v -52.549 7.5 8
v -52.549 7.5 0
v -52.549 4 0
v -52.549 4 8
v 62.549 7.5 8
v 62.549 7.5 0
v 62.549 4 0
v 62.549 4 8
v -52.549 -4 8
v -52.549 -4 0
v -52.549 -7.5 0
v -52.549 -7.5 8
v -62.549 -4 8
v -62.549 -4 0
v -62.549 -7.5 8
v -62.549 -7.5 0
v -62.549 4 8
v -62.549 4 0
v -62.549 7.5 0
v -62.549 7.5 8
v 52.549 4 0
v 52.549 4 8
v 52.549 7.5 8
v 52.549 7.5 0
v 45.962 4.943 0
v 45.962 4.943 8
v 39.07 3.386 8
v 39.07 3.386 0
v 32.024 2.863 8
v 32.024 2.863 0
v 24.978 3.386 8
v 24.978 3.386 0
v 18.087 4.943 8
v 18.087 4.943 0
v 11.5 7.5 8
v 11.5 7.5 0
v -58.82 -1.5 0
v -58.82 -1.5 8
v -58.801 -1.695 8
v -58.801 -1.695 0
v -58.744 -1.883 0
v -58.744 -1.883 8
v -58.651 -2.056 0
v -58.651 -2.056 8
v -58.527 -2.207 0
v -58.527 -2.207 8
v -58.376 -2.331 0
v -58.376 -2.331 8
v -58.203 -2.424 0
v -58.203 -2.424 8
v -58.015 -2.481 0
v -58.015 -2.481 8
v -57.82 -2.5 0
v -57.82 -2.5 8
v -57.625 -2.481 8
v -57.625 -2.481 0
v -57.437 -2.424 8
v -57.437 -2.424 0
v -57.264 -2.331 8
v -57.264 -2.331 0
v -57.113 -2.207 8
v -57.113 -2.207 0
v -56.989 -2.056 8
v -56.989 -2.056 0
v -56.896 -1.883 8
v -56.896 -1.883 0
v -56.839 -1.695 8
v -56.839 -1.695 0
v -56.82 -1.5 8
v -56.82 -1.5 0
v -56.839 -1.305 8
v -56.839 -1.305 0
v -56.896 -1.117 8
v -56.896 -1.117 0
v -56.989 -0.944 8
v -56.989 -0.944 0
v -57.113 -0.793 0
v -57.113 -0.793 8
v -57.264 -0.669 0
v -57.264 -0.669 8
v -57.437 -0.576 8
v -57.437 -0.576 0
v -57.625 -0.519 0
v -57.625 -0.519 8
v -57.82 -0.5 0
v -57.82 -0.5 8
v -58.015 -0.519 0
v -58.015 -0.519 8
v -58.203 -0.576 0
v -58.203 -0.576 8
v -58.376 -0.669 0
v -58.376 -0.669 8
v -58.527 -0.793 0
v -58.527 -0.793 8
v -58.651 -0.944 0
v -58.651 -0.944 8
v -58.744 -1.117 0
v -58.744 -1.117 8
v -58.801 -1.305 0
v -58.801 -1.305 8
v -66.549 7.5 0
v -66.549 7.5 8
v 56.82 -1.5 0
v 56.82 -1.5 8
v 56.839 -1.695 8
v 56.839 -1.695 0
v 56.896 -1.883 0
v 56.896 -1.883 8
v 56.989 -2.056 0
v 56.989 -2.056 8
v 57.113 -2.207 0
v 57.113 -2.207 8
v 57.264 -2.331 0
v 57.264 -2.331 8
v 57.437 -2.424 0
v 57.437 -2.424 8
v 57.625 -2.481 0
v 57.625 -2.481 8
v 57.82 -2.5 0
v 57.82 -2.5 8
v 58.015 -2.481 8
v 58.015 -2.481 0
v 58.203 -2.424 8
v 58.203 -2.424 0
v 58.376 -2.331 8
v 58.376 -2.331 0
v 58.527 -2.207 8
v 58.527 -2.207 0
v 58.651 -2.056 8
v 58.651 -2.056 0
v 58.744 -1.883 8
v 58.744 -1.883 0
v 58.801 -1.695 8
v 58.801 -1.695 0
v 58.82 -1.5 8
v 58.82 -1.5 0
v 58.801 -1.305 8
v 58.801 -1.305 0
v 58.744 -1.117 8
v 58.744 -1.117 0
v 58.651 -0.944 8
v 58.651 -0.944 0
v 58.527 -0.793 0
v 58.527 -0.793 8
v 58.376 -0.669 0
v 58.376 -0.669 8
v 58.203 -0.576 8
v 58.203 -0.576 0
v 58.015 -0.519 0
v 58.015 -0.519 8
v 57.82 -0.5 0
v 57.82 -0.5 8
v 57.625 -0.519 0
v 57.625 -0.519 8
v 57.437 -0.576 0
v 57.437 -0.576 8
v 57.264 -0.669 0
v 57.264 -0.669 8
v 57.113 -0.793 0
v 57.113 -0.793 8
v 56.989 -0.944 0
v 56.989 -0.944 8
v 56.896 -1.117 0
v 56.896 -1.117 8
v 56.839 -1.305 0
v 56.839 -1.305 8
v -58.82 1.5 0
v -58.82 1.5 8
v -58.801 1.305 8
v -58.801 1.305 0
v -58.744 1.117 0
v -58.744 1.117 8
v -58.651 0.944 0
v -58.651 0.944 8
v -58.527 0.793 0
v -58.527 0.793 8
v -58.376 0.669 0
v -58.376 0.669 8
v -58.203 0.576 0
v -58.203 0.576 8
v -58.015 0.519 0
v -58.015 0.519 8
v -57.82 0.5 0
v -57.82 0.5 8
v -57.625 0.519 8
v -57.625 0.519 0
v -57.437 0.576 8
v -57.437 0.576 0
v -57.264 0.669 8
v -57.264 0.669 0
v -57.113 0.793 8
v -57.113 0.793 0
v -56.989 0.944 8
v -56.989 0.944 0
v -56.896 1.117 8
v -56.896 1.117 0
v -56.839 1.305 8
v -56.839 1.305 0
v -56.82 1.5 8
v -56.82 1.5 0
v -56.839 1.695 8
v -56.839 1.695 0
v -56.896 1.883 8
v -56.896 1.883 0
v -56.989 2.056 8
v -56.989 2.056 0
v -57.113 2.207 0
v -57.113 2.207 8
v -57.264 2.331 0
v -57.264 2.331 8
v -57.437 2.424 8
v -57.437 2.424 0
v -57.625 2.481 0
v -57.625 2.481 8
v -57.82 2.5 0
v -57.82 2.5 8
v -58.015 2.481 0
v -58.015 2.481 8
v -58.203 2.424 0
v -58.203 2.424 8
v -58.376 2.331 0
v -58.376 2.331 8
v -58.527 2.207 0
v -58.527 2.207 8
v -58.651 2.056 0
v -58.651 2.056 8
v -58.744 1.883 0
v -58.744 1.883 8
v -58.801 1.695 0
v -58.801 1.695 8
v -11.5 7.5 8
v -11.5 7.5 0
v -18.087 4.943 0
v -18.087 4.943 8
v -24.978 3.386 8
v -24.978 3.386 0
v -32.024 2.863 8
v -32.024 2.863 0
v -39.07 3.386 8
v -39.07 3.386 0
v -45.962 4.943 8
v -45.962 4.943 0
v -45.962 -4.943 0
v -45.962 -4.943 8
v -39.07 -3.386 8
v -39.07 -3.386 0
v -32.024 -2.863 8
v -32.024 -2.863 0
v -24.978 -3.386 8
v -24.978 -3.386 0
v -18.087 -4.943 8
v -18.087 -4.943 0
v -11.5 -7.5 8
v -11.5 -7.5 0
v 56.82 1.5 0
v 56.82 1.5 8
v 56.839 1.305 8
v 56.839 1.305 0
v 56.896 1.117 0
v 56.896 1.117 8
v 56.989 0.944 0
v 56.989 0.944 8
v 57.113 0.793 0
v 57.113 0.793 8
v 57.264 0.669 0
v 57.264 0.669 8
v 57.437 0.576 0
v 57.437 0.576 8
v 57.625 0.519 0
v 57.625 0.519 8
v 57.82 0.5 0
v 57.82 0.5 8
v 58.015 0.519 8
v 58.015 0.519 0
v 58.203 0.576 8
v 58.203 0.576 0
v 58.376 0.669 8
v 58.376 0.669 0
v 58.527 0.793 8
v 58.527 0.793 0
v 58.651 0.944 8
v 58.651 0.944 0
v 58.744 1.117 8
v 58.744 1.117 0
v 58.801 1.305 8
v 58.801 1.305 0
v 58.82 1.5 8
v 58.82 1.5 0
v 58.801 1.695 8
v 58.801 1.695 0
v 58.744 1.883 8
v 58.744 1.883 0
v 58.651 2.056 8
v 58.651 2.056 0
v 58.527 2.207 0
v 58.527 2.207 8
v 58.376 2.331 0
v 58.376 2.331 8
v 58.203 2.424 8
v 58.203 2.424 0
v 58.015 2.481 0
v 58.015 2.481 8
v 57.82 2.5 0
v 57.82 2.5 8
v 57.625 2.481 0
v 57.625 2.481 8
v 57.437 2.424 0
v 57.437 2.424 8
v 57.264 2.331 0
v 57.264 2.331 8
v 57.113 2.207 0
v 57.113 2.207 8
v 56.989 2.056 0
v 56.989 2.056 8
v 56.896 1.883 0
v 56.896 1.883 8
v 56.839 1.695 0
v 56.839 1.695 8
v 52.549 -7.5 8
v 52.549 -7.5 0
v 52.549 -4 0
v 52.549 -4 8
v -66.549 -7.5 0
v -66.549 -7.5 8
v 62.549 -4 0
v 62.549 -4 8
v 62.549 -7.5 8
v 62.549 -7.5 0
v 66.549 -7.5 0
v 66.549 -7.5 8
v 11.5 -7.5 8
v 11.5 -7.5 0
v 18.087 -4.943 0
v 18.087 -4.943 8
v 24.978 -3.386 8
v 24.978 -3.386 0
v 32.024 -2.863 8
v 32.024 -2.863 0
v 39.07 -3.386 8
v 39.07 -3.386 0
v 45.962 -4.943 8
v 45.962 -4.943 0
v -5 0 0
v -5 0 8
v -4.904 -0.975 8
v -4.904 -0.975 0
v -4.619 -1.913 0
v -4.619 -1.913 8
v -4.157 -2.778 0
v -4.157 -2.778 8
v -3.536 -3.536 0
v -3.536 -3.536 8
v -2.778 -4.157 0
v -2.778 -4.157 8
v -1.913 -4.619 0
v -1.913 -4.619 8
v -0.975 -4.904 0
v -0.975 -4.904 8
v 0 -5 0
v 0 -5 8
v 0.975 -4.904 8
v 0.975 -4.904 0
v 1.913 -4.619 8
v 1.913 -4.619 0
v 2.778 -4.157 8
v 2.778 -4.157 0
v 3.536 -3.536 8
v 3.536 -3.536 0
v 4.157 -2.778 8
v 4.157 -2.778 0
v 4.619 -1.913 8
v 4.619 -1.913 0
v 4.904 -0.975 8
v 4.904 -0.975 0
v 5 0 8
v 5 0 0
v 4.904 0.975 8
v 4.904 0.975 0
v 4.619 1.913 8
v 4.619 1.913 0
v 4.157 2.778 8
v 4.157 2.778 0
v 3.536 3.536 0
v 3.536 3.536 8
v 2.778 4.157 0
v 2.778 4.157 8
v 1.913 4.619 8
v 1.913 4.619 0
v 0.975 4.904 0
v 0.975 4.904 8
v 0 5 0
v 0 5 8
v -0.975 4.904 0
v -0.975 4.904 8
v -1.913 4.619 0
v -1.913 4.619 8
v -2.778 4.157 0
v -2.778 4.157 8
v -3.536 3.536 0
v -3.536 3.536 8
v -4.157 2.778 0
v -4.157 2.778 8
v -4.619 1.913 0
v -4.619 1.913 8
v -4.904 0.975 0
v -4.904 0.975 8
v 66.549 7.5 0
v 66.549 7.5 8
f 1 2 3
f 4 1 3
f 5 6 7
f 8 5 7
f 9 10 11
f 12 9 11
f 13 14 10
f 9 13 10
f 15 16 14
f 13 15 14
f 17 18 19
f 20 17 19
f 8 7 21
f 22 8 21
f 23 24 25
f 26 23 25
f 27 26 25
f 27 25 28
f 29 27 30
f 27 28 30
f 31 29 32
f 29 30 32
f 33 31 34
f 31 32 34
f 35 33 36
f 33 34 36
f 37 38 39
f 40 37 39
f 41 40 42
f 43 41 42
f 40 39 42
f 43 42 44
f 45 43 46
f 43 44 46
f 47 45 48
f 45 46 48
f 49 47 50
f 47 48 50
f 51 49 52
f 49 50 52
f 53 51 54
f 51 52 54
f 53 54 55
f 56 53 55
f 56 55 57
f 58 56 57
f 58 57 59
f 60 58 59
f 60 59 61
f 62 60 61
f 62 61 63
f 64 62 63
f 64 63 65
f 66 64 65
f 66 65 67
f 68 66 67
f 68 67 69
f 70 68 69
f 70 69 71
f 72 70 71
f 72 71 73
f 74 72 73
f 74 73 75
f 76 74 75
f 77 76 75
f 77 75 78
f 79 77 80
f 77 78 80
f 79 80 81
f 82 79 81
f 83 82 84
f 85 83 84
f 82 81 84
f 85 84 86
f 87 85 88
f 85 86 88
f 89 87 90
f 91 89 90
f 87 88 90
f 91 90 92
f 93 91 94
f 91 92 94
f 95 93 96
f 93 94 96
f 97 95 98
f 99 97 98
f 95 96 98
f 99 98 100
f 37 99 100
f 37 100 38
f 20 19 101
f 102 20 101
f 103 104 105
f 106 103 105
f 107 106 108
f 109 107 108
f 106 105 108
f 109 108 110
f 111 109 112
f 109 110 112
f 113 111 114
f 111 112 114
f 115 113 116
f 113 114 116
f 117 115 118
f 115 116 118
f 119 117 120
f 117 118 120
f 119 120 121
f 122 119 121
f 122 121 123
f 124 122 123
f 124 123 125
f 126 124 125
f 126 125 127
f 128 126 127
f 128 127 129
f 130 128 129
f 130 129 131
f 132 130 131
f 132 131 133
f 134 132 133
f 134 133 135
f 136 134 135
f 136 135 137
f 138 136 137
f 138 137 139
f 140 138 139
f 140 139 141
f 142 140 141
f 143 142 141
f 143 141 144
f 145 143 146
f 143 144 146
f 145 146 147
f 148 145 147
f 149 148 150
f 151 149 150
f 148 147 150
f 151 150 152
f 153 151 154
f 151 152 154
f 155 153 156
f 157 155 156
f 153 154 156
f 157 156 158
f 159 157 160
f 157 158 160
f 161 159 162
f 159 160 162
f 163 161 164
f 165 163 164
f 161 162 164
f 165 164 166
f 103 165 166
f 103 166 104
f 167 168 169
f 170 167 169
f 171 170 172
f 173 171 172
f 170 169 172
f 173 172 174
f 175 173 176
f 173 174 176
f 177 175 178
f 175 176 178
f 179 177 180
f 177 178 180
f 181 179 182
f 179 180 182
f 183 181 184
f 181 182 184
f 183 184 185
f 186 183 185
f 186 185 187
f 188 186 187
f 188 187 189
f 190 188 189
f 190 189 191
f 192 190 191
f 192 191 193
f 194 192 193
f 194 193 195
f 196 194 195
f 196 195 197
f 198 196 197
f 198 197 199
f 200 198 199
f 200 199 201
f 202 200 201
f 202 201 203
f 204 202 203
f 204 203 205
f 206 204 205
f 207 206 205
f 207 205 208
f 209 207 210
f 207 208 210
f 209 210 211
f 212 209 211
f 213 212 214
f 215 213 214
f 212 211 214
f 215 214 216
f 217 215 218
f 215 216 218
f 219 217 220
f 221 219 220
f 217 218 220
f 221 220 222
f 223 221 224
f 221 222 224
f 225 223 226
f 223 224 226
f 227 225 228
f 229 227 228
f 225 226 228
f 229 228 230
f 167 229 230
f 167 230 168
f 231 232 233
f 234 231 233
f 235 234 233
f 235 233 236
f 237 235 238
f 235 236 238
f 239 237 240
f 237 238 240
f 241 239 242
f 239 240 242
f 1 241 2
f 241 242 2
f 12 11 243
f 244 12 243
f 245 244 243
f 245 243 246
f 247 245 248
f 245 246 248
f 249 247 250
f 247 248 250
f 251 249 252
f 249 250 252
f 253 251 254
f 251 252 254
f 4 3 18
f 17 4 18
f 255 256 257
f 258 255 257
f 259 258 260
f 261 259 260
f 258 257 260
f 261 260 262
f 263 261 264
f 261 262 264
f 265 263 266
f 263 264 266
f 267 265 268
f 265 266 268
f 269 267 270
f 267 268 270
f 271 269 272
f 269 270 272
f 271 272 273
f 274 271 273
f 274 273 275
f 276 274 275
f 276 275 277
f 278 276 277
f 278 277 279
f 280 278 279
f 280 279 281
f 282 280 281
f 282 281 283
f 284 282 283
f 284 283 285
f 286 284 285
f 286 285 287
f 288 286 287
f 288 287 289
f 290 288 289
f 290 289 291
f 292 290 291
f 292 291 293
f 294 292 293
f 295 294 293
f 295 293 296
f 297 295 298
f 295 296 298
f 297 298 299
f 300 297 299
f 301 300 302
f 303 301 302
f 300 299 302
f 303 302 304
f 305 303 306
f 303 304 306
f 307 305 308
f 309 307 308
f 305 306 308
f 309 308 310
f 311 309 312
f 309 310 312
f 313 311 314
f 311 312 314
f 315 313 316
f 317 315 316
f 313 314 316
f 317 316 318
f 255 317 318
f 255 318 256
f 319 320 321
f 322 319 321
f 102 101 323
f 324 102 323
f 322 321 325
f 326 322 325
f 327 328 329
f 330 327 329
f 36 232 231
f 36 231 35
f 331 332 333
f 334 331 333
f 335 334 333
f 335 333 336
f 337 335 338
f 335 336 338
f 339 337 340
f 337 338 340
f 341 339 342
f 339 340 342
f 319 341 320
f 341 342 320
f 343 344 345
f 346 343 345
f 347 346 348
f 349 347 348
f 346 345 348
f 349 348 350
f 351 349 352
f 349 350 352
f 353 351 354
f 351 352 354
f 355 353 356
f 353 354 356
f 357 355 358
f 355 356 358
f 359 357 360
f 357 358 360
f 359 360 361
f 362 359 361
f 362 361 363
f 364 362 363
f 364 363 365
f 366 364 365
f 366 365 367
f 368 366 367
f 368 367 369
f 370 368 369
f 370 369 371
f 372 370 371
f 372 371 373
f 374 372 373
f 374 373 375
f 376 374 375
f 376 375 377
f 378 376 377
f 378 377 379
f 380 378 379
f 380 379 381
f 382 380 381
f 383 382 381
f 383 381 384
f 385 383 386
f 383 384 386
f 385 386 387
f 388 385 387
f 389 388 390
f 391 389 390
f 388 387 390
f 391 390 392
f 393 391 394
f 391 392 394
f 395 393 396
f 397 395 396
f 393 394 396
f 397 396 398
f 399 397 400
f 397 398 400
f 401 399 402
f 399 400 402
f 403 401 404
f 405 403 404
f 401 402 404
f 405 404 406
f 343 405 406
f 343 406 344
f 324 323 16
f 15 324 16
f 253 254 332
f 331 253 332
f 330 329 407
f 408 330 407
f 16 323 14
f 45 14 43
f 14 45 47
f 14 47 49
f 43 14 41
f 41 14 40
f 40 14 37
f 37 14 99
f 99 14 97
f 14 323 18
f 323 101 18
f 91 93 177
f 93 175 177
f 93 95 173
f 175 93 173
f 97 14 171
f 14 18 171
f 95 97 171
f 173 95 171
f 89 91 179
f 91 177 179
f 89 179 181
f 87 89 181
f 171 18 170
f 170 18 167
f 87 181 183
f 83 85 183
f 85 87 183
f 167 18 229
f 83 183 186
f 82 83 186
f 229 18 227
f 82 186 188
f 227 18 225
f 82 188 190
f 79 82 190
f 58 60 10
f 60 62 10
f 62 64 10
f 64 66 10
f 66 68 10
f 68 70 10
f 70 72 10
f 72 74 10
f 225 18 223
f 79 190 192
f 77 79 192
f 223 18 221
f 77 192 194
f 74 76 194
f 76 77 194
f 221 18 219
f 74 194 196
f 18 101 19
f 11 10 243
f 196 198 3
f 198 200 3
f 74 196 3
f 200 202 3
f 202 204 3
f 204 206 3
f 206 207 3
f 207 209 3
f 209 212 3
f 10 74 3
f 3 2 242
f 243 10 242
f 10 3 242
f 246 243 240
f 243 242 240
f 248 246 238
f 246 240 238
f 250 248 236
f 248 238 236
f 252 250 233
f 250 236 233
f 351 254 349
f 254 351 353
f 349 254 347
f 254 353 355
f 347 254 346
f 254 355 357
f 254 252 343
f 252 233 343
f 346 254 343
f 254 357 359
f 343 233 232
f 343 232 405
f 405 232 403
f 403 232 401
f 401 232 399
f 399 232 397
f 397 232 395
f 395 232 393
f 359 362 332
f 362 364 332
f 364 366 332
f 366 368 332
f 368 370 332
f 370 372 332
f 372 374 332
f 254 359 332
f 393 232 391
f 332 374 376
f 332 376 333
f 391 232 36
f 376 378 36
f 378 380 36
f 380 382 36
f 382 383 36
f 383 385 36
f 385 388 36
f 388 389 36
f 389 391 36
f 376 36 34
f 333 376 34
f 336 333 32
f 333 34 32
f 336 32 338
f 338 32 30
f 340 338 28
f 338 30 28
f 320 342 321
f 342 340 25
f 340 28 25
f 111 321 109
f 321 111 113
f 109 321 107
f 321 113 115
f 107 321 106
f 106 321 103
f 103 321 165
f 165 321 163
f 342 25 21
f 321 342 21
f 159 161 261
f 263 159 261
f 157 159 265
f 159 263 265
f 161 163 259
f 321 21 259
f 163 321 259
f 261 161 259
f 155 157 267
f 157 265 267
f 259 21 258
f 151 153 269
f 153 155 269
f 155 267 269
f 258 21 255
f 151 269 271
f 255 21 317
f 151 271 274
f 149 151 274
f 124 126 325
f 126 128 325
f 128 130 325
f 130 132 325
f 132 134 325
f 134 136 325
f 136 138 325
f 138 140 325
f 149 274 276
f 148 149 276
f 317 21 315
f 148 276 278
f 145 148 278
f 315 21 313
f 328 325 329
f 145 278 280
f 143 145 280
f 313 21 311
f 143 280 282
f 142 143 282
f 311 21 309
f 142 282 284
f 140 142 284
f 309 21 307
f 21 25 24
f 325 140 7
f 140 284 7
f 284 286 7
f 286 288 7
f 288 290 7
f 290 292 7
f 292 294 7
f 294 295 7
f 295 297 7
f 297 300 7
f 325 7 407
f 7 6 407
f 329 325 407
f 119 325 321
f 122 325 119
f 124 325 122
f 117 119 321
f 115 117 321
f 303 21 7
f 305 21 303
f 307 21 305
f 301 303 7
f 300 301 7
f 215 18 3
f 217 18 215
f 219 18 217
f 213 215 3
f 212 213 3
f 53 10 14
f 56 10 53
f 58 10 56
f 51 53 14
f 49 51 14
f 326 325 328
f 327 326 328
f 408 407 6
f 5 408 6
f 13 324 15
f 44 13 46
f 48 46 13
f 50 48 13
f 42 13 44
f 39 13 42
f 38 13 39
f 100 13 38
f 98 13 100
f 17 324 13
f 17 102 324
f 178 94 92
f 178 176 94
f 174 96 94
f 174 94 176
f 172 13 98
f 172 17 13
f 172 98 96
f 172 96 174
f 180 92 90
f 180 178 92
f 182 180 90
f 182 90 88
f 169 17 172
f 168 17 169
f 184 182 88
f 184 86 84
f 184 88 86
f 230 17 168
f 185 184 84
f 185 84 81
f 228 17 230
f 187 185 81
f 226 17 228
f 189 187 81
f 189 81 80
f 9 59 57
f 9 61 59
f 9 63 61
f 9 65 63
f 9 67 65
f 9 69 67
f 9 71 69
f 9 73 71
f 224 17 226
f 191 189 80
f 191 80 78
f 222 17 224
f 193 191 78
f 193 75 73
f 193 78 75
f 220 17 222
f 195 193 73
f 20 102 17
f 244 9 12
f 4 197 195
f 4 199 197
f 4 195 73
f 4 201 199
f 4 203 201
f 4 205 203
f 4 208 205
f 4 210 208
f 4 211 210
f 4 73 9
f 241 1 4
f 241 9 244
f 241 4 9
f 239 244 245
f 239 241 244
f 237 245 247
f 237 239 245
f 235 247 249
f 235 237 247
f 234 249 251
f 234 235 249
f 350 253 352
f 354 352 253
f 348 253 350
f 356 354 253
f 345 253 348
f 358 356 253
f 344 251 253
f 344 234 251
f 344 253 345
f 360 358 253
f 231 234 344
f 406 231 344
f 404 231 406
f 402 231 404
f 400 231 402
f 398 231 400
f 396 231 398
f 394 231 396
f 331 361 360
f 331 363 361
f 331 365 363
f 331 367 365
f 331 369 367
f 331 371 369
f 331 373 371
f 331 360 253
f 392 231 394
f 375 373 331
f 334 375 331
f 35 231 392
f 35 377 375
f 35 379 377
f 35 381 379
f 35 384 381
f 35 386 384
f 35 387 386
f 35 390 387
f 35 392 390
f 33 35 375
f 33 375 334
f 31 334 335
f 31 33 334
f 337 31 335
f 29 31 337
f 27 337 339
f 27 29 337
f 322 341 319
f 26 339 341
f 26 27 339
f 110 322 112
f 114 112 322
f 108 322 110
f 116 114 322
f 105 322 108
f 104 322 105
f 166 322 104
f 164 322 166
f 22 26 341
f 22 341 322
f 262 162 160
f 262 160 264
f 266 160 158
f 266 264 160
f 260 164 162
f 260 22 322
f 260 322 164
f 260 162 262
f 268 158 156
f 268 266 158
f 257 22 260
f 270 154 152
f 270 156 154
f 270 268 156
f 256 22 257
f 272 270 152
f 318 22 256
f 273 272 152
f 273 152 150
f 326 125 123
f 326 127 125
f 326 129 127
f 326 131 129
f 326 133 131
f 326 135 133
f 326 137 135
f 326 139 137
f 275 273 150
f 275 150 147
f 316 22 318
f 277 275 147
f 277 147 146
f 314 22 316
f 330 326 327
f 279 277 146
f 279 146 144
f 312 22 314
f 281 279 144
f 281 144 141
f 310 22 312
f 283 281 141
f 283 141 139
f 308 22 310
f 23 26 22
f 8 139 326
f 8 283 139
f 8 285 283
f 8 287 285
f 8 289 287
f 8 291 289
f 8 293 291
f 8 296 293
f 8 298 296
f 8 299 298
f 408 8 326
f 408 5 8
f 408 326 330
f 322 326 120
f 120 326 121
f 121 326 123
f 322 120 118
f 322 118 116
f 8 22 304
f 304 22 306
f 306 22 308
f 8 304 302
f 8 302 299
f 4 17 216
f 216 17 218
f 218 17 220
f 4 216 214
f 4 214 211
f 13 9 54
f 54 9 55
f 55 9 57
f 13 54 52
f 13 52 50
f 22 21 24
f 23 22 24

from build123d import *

# Parameters (mm, degrees)
F0_W     = 23
F0_H     = 15
F1_DEPTH = 8
F2_D     = 2
F2_DEPTH = 50
F3_D     = 10
F3_DEPTH = 50


with BuildPart() as f1:
    # F0 (on Top) → F1 (new body)
    with BuildSketch(Plane.XY):
        Rectangle(F0_W, F0_H)
        with BuildLine():
            Line((-11.5, -7.5), (-11.5, 7.5))
            ThreePointArc((-11.5, 7.5), (-32.024307, 2.863257), (-52.548613, 7.5))
            Line((-52.548613, 7.5), (-52.548613, 4))
            Line((-52.548613, 4), (-62.548613, 4))
            Line((-62.548613, 4), (-62.548613, 7.5))
            Line((-62.548613, 7.5), (-66.548613, 7.5))
            Line((-66.548613, 7.5), (-66.548613, -7.5))
            Line((-66.548613, -7.5), (-62.548613, -7.5))
            Line((-62.548613, -7.5), (-62.548613, -4))
            Line((-62.548613, -4), (-52.548613, -4))
            Line((-52.548613, -4), (-52.548613, -7.5))
            ThreePointArc((-52.548613, -7.5), (-32.024307, -2.863257), (-11.5, -7.5))
        make_face()
        with BuildLine():
            ThreePointArc((52.548613, 7.5), (32.024307, 2.863257), (11.5, 7.5))
            Line((11.5, 7.5), (11.5, -7.5))
            ThreePointArc((11.5, -7.5), (32.024307, -2.863257), (52.548613, -7.5))
            Line((52.548613, -7.5), (52.548613, -4))
            Line((52.548613, -4), (62.548613, -4))
            Line((62.548613, -4), (62.548613, -7.5))
            Line((62.548613, -7.5), (66.548613, -7.5))
            Line((66.548613, -7.5), (66.548613, 7.5))
            Line((66.548613, 7.5), (62.548613, 7.5))
            Line((62.548613, 7.5), (62.548613, 4))
            Line((62.548613, 4), (52.548613, 4))
            Line((52.548613, 4), (52.548613, 7.5))
        make_face()
    extrude(amount=F1_DEPTH)

    # F2
    with Locations(Plane(origin=(0, 0, 0), x_dir=(1, 0, 0), z_dir=(0, 0, -1))):
        with Locations((-57.820026, 1.5), (-57.820026, -1.5), (57.820026, 1.5), (57.820026, -1.5)):
            Hole(F2_D / 2, depth=F2_DEPTH)

    # F3
    with Locations(Plane(origin=(0, 0, 0), x_dir=(1, 0, 0), z_dir=(0, 0, -1))):
        with Locations((0, 0)):
            Hole(F3_D / 2, depth=F3_DEPTH)


solid = f1.part
